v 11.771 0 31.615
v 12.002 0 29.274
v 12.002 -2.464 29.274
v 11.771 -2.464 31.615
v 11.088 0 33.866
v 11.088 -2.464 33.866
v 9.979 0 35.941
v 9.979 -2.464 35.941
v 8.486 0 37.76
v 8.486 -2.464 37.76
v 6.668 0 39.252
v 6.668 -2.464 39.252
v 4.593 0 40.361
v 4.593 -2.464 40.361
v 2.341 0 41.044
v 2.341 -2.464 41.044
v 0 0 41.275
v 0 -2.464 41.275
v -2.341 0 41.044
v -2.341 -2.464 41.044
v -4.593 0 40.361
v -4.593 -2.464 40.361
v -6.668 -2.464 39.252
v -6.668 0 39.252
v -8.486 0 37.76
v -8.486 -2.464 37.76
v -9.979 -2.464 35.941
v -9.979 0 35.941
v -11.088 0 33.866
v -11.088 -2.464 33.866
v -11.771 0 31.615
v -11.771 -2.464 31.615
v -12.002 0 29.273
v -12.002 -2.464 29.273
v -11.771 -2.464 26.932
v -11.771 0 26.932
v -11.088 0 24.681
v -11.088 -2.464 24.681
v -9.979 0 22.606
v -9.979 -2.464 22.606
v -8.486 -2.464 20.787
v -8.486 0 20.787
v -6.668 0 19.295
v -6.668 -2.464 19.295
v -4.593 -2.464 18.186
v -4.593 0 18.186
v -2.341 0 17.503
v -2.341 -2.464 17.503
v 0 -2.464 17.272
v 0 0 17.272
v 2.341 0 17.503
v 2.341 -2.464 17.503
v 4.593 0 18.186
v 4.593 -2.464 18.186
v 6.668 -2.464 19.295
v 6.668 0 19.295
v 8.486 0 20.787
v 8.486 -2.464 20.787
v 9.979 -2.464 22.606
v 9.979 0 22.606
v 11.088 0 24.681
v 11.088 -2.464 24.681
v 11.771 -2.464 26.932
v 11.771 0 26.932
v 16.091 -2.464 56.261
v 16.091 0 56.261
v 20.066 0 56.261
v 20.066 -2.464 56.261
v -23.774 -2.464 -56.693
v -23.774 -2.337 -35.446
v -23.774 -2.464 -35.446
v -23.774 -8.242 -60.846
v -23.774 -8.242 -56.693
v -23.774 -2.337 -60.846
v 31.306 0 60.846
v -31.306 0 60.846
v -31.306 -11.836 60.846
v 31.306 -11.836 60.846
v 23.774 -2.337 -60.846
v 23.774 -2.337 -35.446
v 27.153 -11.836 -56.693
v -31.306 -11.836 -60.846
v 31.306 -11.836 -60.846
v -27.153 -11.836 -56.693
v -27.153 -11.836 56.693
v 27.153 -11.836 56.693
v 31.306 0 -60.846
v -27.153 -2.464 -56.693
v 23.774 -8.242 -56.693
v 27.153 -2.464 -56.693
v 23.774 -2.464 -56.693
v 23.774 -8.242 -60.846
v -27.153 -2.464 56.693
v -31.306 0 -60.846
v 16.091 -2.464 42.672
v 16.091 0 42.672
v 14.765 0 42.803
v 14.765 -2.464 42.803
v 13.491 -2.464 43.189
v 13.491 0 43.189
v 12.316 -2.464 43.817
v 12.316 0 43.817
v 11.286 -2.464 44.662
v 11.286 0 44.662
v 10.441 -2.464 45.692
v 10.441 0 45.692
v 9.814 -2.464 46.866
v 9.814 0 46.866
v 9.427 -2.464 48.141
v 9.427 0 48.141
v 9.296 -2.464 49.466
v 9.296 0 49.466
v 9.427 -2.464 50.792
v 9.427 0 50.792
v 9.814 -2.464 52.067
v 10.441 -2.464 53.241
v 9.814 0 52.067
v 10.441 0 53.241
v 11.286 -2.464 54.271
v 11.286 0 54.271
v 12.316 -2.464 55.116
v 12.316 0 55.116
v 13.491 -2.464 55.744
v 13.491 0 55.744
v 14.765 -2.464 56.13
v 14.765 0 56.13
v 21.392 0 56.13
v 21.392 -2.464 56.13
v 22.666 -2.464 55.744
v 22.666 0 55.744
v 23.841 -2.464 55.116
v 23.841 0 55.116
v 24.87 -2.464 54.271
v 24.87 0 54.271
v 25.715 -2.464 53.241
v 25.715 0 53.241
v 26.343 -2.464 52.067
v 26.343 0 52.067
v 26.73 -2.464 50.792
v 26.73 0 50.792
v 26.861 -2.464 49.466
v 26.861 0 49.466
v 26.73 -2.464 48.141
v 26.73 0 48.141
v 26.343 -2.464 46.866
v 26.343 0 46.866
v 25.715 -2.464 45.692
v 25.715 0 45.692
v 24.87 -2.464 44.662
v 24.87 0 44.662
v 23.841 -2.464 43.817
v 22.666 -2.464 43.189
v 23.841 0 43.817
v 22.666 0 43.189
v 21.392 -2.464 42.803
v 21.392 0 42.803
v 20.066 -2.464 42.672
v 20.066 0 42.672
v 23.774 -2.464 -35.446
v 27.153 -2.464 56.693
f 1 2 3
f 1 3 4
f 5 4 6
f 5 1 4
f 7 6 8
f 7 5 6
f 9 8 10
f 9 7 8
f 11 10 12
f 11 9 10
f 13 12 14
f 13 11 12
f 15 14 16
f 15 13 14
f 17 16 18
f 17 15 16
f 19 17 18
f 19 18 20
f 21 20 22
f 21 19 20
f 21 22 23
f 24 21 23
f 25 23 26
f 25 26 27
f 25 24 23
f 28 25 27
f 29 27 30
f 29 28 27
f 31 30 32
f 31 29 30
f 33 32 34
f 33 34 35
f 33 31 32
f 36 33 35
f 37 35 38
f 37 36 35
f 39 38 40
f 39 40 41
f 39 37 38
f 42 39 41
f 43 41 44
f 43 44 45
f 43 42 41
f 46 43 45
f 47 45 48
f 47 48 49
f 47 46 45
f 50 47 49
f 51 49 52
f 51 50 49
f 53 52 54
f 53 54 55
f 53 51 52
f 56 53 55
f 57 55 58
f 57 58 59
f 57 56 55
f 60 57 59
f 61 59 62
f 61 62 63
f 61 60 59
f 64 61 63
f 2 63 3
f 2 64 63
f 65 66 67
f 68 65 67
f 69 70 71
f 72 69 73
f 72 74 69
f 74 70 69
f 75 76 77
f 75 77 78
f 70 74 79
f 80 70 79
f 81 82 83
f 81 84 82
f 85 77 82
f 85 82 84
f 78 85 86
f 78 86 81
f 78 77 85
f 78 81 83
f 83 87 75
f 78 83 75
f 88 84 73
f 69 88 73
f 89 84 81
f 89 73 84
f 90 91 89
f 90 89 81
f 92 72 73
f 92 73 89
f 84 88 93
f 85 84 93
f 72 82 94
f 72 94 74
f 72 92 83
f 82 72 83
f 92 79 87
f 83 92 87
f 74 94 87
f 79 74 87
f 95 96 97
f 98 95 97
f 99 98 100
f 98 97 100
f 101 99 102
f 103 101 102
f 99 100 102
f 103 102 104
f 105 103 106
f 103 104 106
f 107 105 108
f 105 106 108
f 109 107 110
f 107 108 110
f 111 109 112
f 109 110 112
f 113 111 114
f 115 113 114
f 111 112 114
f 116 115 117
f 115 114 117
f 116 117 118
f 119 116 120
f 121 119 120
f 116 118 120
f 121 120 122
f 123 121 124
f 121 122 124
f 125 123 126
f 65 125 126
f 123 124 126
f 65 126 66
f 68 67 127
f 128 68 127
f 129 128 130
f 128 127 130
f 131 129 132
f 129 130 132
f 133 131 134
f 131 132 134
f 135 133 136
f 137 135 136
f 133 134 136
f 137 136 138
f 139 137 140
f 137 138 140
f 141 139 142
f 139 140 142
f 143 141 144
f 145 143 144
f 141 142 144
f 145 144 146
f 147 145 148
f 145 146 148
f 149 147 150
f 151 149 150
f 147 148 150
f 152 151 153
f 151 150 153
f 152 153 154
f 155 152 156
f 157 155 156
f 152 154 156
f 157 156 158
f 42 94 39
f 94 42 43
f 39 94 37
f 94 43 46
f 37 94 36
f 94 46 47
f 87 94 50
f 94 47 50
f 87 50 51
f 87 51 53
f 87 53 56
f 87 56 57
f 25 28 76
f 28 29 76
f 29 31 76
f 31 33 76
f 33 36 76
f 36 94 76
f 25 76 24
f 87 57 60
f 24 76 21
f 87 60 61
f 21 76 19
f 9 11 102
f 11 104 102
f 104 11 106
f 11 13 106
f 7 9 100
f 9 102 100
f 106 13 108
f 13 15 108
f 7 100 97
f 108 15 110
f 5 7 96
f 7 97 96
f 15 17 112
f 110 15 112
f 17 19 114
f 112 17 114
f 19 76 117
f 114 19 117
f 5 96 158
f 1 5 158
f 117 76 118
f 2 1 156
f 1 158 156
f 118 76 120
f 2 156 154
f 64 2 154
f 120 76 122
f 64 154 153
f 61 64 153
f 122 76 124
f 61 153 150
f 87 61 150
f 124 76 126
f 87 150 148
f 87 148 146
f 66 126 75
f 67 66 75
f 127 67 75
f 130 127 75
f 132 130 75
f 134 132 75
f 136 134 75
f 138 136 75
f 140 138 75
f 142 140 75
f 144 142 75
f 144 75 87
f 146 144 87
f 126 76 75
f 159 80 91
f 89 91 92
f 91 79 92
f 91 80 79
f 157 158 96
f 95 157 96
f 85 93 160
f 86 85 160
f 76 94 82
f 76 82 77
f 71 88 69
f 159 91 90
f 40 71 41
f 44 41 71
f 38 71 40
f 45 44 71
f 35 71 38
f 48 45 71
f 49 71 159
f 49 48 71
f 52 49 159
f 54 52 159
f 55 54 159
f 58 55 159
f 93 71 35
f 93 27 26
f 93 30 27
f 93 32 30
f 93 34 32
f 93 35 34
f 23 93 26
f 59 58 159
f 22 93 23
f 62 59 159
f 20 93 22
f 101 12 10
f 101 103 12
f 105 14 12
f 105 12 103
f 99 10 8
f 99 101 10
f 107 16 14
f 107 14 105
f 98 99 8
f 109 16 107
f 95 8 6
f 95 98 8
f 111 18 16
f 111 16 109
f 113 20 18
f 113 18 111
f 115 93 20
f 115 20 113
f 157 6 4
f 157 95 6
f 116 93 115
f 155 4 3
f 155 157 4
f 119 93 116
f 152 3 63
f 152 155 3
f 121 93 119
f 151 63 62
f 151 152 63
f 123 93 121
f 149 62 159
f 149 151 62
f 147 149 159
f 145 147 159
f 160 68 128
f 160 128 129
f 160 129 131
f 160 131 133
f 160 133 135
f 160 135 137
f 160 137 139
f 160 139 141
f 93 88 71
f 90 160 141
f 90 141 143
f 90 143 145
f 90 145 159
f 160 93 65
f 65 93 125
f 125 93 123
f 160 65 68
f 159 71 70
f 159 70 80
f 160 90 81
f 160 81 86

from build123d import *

# Parameters (mm, degrees)
F0_W     = 54.3052
F0_H     = 113.3856
F0_R     = 12.0015
F1_DEPTH = 2.4638
F0_W_2   = 62.611
F0_H_2   = 121.6914
F2_DEPTH = 11.8364
F3_W     = 47.5488
F3_H     = 5.9055
F4_DEPTH = 25.4


with BuildPart() as f1:
    # F0 (on Front) → F1 (new body)
    with BuildSketch(Plane.XZ):
        Rectangle(F0_W, F0_H)
        with Locations((0, 29.2735)):
            Circle(F0_R, mode=Mode.SUBTRACT)
        with BuildLine():
            ThreePointArc((16.0909, 42.672), (9.2964, 49.4665), (16.0909, 56.261))
            Line((16.0909, 56.261), (20.066003, 56.261))
            ThreePointArc((20.066003, 56.261), (26.8605, 49.466498), (20.066, 42.672))
            Line((20.066, 42.672), (16.0909, 42.672))
        make_face(mode=Mode.SUBTRACT)
    extrude(amount=F1_DEPTH)

    # F0 (on Front) → F2 (join)
    with BuildSketch(Plane.XZ):
        Rectangle(F0_W_2, F0_H_2)
        Rectangle(F0_W, F0_H, mode=Mode.SUBTRACT)
    extrude(amount=F2_DEPTH)

    # F3 (on face) → F4 (cut)
    with BuildSketch(Plane(origin=(0, 0, -60.8457), x_dir=(1, 0, 0), z_dir=(0, 0, -1))):
        with Locations((0, 5.28955)):
            Rectangle(F3_W, F3_H)
    extrude(amount=-F4_DEPTH, mode=Mode.SUBTRACT)


solid = f1.part
